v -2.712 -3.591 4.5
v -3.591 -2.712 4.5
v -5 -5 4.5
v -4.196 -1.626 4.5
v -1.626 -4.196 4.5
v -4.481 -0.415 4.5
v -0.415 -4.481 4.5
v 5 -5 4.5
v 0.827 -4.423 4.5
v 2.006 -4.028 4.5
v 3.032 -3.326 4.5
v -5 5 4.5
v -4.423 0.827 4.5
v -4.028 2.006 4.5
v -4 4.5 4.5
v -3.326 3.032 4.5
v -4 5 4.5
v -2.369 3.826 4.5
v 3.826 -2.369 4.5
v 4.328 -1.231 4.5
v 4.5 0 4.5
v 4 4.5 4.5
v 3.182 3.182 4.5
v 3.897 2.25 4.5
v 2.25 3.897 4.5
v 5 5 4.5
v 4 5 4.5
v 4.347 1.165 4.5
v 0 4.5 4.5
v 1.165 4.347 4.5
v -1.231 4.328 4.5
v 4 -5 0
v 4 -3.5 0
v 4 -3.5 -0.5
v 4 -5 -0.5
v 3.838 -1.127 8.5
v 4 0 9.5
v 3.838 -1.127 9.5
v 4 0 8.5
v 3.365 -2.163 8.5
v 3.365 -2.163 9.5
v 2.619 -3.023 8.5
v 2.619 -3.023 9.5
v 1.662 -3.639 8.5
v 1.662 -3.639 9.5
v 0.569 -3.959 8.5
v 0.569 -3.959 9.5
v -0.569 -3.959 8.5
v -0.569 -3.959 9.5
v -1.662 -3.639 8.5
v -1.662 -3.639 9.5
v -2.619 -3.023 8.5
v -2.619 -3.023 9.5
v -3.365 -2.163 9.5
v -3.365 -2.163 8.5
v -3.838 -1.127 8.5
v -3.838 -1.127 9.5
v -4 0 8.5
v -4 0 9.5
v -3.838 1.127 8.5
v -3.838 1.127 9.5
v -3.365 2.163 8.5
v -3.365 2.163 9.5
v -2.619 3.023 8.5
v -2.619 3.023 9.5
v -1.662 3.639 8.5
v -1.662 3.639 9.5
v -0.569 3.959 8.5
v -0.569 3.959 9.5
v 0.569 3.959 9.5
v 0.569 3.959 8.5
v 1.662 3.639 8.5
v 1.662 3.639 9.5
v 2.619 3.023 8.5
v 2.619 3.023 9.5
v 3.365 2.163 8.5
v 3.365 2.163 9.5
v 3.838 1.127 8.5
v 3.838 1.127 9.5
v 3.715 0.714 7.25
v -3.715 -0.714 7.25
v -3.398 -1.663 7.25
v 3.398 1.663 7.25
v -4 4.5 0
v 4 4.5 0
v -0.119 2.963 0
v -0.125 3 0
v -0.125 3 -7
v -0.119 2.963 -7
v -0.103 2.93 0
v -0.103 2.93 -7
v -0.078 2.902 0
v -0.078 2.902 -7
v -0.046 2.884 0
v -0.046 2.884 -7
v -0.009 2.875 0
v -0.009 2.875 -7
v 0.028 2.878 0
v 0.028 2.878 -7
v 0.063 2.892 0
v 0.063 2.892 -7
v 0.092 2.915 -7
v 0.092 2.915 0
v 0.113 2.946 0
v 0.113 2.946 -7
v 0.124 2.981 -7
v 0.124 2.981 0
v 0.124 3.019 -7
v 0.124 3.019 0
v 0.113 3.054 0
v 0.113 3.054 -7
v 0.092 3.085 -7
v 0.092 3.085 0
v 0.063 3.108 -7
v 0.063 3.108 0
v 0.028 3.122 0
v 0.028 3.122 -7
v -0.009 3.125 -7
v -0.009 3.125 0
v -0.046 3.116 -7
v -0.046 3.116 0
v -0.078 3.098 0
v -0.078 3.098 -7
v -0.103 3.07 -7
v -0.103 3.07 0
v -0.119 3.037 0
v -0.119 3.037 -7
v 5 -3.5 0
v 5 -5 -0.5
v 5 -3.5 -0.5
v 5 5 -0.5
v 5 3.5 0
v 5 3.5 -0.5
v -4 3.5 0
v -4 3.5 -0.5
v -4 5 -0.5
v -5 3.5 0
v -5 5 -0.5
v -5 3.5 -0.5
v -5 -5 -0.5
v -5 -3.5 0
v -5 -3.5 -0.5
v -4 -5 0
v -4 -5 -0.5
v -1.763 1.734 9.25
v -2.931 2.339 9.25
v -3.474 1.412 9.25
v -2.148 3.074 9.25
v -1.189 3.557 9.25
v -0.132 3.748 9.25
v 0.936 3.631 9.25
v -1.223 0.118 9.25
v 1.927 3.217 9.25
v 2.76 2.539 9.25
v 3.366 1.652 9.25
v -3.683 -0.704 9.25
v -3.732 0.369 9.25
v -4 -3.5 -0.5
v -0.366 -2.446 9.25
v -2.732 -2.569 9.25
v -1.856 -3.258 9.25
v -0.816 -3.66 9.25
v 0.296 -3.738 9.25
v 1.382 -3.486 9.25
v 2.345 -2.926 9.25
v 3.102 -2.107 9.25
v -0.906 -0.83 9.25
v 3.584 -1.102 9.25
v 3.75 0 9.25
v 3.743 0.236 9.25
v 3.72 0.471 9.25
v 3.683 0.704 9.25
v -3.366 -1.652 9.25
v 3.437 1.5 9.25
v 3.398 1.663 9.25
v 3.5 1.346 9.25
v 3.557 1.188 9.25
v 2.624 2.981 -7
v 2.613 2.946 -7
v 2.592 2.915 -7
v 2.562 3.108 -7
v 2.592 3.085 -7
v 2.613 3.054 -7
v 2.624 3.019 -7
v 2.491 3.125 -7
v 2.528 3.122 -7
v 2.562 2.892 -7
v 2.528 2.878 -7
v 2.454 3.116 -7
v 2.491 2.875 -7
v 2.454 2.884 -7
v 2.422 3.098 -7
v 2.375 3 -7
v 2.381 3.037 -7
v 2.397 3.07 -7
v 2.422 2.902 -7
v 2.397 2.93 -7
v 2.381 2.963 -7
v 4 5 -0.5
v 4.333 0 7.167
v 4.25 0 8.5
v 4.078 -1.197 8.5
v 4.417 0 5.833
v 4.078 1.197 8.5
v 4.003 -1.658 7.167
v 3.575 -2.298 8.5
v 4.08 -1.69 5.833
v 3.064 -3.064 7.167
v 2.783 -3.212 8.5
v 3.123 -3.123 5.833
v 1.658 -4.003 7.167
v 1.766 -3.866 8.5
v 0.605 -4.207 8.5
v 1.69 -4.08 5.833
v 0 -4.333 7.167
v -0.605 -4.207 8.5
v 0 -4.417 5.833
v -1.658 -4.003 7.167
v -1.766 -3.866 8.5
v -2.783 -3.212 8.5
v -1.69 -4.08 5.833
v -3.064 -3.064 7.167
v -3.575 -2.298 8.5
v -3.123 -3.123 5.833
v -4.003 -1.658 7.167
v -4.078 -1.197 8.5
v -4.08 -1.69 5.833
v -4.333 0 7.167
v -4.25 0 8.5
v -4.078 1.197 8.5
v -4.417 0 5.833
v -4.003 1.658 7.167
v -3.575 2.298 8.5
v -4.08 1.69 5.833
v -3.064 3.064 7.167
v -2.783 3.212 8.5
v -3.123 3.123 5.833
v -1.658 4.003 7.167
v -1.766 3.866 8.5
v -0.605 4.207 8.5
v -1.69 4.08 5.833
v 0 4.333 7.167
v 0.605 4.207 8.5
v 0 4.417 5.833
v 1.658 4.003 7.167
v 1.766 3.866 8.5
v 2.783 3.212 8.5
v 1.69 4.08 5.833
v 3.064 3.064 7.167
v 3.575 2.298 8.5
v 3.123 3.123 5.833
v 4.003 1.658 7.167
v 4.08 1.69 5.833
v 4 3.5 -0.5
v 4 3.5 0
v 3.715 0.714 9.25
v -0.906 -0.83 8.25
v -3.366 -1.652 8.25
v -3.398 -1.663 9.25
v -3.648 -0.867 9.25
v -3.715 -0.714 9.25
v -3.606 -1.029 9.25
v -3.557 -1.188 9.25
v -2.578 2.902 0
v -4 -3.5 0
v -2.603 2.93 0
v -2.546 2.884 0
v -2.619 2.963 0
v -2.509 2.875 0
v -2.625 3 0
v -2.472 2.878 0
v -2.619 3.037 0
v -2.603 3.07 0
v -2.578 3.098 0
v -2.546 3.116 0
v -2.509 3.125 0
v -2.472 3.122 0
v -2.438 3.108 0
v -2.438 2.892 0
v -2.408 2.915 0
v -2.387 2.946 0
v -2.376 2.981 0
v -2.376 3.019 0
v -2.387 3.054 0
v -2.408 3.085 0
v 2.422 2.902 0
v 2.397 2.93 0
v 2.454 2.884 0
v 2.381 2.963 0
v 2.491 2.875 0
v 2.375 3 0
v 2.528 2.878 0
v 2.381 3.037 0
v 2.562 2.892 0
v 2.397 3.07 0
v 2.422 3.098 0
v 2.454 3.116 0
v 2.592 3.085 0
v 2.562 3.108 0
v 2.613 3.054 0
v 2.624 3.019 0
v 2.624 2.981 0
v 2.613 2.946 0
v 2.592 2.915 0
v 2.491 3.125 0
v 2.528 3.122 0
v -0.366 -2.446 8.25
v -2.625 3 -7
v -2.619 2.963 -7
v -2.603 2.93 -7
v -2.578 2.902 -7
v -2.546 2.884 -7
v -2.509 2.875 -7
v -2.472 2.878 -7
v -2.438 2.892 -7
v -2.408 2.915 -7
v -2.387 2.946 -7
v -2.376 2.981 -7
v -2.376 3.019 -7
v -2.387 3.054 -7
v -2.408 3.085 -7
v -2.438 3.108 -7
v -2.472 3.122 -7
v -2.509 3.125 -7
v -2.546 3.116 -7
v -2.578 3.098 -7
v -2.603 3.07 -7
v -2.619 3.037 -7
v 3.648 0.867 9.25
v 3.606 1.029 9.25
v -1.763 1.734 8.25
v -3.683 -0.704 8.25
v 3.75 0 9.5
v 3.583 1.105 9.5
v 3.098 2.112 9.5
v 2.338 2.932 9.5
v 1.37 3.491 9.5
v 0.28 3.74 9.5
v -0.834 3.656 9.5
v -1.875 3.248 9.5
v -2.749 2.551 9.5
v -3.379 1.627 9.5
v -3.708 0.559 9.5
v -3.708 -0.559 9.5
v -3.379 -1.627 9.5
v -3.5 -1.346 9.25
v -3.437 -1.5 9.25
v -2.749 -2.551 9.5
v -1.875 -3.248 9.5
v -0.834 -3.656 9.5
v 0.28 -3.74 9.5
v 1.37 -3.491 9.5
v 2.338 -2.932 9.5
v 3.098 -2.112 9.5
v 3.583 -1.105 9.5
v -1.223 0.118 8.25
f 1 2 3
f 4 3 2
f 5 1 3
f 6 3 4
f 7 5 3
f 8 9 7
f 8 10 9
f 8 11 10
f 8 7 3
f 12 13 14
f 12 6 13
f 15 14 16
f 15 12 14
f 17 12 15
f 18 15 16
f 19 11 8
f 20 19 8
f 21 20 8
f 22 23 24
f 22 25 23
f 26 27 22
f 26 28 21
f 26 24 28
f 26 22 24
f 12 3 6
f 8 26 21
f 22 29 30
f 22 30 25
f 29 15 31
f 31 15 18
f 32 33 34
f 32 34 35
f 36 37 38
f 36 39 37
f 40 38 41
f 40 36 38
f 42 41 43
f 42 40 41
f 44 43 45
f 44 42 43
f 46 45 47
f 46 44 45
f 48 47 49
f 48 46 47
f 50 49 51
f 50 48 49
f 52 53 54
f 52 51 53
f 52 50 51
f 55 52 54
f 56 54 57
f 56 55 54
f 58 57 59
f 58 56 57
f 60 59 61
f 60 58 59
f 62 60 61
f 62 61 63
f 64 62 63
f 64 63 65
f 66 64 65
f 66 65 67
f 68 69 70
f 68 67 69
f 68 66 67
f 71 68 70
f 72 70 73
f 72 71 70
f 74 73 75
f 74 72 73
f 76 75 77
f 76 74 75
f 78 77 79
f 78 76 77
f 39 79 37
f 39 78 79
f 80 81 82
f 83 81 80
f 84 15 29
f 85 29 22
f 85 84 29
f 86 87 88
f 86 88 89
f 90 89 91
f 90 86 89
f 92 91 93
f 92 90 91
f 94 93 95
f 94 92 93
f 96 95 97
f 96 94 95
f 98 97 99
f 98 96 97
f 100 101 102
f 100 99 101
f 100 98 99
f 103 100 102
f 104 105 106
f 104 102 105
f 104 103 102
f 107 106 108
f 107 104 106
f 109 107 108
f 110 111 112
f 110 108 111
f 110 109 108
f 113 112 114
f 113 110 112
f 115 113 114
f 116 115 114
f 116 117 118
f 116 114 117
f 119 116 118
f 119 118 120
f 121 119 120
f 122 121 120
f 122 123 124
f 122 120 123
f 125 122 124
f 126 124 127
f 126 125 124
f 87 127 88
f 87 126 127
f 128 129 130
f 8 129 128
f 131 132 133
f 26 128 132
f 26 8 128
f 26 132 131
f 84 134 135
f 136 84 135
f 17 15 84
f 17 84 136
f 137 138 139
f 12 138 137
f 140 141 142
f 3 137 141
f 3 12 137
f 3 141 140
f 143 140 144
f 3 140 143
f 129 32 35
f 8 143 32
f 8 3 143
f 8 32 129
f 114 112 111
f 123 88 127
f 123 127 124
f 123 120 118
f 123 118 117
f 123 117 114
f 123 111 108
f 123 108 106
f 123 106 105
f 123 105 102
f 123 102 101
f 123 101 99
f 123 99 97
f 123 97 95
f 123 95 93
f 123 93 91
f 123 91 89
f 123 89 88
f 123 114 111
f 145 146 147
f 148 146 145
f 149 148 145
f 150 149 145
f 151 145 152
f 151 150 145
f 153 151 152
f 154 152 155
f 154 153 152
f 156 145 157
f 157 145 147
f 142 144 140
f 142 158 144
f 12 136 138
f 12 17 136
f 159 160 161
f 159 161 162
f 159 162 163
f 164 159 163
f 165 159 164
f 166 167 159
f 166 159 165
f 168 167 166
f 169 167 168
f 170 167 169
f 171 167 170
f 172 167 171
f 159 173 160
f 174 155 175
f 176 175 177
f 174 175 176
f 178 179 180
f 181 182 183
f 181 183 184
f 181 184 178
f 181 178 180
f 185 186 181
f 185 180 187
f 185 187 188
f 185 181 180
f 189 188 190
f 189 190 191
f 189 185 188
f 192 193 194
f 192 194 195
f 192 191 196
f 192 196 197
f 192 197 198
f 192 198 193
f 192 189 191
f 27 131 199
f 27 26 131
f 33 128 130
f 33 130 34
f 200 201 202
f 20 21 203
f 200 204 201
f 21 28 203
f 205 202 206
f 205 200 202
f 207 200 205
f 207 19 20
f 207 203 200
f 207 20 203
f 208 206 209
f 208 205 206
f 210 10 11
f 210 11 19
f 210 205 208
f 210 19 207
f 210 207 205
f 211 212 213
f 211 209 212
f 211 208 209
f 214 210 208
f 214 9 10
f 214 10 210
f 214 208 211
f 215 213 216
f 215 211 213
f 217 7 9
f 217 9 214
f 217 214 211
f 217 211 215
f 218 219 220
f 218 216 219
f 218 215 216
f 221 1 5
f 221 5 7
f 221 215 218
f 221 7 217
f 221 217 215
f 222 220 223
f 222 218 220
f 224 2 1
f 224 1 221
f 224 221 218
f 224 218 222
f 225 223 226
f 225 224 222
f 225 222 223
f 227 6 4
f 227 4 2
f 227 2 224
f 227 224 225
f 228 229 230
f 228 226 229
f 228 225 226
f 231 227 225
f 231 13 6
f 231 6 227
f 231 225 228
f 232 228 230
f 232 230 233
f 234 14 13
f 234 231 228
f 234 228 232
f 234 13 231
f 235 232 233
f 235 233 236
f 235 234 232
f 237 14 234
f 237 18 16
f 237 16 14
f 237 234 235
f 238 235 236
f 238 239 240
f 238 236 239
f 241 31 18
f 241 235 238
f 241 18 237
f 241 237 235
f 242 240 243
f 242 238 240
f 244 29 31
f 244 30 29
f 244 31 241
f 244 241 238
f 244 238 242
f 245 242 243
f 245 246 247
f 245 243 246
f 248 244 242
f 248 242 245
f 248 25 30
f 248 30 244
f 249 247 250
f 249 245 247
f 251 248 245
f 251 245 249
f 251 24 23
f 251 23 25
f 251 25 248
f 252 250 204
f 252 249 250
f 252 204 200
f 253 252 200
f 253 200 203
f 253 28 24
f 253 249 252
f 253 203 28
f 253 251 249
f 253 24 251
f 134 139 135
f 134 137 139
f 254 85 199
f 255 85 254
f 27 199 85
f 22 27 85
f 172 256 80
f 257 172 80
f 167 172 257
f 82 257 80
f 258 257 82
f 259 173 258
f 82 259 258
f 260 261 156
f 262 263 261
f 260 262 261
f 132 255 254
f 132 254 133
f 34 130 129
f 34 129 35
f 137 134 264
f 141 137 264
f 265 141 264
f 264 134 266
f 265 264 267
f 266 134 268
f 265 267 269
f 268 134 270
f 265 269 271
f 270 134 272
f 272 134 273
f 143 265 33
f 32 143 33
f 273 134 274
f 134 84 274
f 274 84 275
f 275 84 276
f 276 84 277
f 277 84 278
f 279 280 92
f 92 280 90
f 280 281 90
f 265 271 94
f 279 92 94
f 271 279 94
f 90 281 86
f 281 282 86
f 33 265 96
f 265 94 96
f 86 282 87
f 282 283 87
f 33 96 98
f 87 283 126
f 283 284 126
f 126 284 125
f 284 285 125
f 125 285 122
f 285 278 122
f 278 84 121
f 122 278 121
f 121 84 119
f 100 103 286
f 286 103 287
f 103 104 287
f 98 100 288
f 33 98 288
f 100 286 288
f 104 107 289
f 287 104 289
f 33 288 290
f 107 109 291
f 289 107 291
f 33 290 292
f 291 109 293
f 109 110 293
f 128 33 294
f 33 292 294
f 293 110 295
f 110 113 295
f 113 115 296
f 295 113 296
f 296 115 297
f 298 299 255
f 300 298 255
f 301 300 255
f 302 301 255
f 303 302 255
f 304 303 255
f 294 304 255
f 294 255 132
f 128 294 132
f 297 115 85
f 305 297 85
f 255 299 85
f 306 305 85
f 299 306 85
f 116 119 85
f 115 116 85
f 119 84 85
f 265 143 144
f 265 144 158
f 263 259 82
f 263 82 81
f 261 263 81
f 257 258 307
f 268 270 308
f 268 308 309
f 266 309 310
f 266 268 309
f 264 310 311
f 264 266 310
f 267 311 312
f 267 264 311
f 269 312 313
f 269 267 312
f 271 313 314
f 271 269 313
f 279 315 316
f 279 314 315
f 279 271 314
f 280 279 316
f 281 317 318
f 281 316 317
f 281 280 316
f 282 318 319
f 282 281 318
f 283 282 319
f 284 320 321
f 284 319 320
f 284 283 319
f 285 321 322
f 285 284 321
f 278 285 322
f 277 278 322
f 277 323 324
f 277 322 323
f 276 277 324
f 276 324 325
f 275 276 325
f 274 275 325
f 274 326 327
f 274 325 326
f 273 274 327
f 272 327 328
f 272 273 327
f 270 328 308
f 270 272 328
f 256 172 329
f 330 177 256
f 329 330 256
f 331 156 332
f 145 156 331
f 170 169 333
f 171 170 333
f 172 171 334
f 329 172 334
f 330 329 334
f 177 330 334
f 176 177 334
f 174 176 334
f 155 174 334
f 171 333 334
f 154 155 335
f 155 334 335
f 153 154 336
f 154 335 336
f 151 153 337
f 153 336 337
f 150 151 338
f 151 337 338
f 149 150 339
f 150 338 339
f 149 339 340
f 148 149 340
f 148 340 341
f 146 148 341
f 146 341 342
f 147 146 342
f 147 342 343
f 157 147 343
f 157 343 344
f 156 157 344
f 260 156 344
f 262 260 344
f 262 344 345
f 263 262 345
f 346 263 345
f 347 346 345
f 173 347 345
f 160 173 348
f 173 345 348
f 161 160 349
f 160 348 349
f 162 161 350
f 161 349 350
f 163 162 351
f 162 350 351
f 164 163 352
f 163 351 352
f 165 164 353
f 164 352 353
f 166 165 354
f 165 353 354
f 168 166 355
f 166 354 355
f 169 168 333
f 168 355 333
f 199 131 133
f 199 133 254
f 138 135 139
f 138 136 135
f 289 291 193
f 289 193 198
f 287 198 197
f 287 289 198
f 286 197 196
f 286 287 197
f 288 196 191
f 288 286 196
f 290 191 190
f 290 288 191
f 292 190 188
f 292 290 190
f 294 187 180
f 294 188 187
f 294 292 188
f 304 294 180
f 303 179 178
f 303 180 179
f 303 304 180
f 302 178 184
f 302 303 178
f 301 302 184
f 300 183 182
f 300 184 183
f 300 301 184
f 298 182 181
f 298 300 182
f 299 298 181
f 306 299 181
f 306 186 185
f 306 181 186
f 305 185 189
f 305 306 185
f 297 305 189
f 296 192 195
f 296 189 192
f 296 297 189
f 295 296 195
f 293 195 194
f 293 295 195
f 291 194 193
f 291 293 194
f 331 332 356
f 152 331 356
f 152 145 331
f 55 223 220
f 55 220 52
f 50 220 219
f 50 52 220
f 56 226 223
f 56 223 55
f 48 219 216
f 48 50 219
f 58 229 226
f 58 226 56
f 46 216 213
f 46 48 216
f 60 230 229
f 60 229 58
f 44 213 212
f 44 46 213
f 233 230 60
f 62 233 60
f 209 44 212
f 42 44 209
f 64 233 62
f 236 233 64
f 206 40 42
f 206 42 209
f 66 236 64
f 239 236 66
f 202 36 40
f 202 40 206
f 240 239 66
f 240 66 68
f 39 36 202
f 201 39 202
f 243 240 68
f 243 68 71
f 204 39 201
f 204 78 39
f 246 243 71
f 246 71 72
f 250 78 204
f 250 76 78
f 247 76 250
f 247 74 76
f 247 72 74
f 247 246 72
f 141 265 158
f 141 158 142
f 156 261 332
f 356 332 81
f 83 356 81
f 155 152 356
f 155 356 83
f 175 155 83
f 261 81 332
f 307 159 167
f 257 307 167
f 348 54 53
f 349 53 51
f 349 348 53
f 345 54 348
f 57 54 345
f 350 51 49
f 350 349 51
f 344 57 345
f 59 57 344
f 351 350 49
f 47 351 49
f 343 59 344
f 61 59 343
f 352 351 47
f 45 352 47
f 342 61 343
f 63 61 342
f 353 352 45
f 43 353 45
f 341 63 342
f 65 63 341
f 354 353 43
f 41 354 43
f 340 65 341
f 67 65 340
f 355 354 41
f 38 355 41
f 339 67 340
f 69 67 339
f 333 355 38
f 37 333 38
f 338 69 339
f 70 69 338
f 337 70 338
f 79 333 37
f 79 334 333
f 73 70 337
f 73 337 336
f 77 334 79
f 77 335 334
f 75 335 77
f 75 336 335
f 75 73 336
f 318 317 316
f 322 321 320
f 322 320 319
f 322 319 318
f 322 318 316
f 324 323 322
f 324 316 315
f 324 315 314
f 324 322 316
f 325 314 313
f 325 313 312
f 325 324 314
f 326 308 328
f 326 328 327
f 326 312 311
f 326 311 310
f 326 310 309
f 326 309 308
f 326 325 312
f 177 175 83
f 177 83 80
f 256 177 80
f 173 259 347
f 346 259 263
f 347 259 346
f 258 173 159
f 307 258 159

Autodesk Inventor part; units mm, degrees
ref_plane "YZ Plane" through (0, 0, 0) normal (1, 0, 0) x (0, 1, 0)
ref_plane "XZ Plane" through (0, 0, 0) normal (0, 1, 0) x (-1, 0, 0)
ref_plane "XY Plane" through (0, 0, 0) normal (0, 0, 1) x (1, 0, 0)
sketch "Sketch1" plane through (0, 0, 0) normal (0, 0, 1) x (1, 0, 0)
  line L0 (-5, 5) -> (5, 5)
  line L1 (5, 5) -> (5, -5)
  line L2 (5, -5) -> (-5, -5)
  line L3 (-5, -5) -> (-5, 5)
  line L4 (-5, 5) -> (5, -5) construction
  line L5 (5, 5) -> (-5, -5) construction
  point P0 (0, 0)
  dimension "d0" = 10
  dimension "d2" = 10
extrude "Extrusion1" add sketch "Sketch1" along normal blind 4.5
sketch "Sketch2" plane through (0, 0, 0) normal (0, 0, -1) x (-1, 0, 0)
  line L0 (-5, 5) -> (-4, 5)
  line L1 (-4, 5) -> (-4, 3.5)
  line L2 (-4, 3.5) -> (-5, 3.5)
  line L3 (-5, 3.5) -> (-5, 5)
  point P0 (0, 0)
  dimension "d5" = 1
  dimension "d6" = 1.5
extrude "Extrusion2" add sketch "Sketch2" along normal blind 0.5
pattern_linear "Rectangular Pattern1" count 2 spacing 9 along (-1, 0, 0) count 2 spacing 8.5 along (0, -1, 0) of "Extrusion2"
sketch "Sketch3" plane through (-5, 5, 4.5) normal (0, 1, 0) x (1, 0, 0)
  line L0 (10, 0) -> (0, 0) projected
  line L1 (1, 4.5) -> (9, 4.5)
  line L2 (9, 4.5) -> (9, 0)
  line L3 (9, 0) -> (1, 0)
  line L4 (1, 0) -> (1, 4.5)
  point P0 (5, 4.5)
extrude "Extrusion3" cut sketch "Sketch3" against normal blind 0.5
sketch "Sketch4" plane through (0, 0, 0) normal (0, 0, -1) x (-1, 0, 0)
  line L0 (4, 4.5) -> (-4, 4.5) projected
  circle A0 centre (0, 3) radius 0.125
  circle A1 centre (2.5, 3) radius 0.125
  circle A2 centre (-2.5, 3) radius 0.125
  point P0 (0, 0)
  dimension "d17" = 2.5
  dimension "d19" = 2.5
  dimension "d20" = 0.25
  dimension "d21" = 1.5
extrude "Extrusion4" add sketch "Sketch4" along normal blind 7
sketch "Sketch5" plane through (0, 0, 4.5) normal (0, 0, 1) x (1, 0, 0)
  circle A0 centre (0, 0) radius 4.5
  dimension "d25" = 9
ref_plane "Work Plane1" through (0, 0, 8.5) normal (0, 0, 1) x (1, 0, 0)
sketch "Sketch6" plane through (0, 0, 8.5) normal (0, 0, 1) x (1, 0, 0)
  circle A0 centre (0, 0) radius 4.25
  dimension "d27" = 8.5
loft "Loft1" add profiles "Sketch6", "Sketch5"
sketch "Sketch8" plane through (0, 0, 8.5) normal (0, 0, 1) x (1, 0, 0)
  circle A0 centre (0, 0) radius 4.25 projected
  circle A1 centre (0, 0) radius 4
  dimension "d34" = 8
extrude "Extrusion5" add sketch "Sketch8" along normal blind 1 contours A1
sketch "Sketch9" plane through (0, 0, 9.5) normal (0, 0, 1) x (1, 0, 0)
  circle A0 centre (0, 0) radius 4 projected
  circle A1 centre (0, 0) radius 3.75
  dimension "d38" = 7.5
extrude "Extrusion6" cut sketch "Sketch9" against normal blind 0.25 contours A1
sketch "Sketch10" plane through (0, 0, 9.25) normal (0, 0, 1) x (1, 0, 0)
  circle A0 centre (0, 0) radius 3.75 projected
  line L0 (3.7151, 0.7143) -> (-3.3982, -1.6628)
  line L1 (-3.3982, -1.6628) -> (-3.7151, -0.7143)
  line L2 (-3.7151, -0.7143) -> (3.3982, 1.6628)
  line L3 (3.3982, 1.6628) -> (3.7151, 0.7143)
  line L4 (3.7151, 0.7143) -> (-3.7151, -0.7143) construction
  line L5 (-3.3982, -1.6628) -> (3.3982, 1.6628) construction
  dimension "d42" = 1
  dimension "d44" = 7.5
extrude "Extrusion7" cut sketch "Sketch10" against normal blind 2 contours L0 A0 L2 | A0 L3 L0 | L0 L1 A0 | A0 L2 L3 | L1 L2 A0
sketch "Sketch11" plane through (0, 0, 9.25) normal (0, 0, 1) x (1, 0, 0)
  line L0 (3.6834, 0.7037) -> (-3.3664, -1.6522) projected
  line L1 (-3.3664, -1.6522) -> (-0.3664, -2.446)
  line L2 (-0.3664, -2.446) -> (-0.9064, -0.8301)
  dimension "d49" = 3
  dimension "d51" = 56.7
  dimension "d53" = 1.6159
extrude "Extrusion8" cut sketch "Sketch11" against normal blind 1
sketch "Sketch13" plane through (0, 0, 9.25) normal (0, 0, 1) x (1, 0, 0)
  arc A0 (3.3664, 1.6522) -> (-3.6834, -0.7037) centre (0, 0) ccw projected
  line L0 (3.6834, 0.7037) -> (-3.3664, -1.6522)
  line L1 (-3.3664, -1.6522) -> (-0.3664, -2.446)
  line L2 (-0.3664, -2.446) -> (-0.9064, -0.8301)
  line L3 (0, 0) -> (-3.5718, -1.1936)
  line L4 (3.3664, 1.6522) -> (-3.6834, -0.7037)
  line L5 (-3.6834, -0.7037) -> (-1.7634, 1.7343)
  line L6 (-1.7634, 1.7343) -> (-1.2234, 0.1184)
  dimension "d55" = 3
  dimension "d56" = 56.7
  dimension "d57" = 1.6159
extrude "Extrusion9" cut sketch "Sketch13" against normal blind 1 contours L5 L6 L4
properties part number "potentiometer"
